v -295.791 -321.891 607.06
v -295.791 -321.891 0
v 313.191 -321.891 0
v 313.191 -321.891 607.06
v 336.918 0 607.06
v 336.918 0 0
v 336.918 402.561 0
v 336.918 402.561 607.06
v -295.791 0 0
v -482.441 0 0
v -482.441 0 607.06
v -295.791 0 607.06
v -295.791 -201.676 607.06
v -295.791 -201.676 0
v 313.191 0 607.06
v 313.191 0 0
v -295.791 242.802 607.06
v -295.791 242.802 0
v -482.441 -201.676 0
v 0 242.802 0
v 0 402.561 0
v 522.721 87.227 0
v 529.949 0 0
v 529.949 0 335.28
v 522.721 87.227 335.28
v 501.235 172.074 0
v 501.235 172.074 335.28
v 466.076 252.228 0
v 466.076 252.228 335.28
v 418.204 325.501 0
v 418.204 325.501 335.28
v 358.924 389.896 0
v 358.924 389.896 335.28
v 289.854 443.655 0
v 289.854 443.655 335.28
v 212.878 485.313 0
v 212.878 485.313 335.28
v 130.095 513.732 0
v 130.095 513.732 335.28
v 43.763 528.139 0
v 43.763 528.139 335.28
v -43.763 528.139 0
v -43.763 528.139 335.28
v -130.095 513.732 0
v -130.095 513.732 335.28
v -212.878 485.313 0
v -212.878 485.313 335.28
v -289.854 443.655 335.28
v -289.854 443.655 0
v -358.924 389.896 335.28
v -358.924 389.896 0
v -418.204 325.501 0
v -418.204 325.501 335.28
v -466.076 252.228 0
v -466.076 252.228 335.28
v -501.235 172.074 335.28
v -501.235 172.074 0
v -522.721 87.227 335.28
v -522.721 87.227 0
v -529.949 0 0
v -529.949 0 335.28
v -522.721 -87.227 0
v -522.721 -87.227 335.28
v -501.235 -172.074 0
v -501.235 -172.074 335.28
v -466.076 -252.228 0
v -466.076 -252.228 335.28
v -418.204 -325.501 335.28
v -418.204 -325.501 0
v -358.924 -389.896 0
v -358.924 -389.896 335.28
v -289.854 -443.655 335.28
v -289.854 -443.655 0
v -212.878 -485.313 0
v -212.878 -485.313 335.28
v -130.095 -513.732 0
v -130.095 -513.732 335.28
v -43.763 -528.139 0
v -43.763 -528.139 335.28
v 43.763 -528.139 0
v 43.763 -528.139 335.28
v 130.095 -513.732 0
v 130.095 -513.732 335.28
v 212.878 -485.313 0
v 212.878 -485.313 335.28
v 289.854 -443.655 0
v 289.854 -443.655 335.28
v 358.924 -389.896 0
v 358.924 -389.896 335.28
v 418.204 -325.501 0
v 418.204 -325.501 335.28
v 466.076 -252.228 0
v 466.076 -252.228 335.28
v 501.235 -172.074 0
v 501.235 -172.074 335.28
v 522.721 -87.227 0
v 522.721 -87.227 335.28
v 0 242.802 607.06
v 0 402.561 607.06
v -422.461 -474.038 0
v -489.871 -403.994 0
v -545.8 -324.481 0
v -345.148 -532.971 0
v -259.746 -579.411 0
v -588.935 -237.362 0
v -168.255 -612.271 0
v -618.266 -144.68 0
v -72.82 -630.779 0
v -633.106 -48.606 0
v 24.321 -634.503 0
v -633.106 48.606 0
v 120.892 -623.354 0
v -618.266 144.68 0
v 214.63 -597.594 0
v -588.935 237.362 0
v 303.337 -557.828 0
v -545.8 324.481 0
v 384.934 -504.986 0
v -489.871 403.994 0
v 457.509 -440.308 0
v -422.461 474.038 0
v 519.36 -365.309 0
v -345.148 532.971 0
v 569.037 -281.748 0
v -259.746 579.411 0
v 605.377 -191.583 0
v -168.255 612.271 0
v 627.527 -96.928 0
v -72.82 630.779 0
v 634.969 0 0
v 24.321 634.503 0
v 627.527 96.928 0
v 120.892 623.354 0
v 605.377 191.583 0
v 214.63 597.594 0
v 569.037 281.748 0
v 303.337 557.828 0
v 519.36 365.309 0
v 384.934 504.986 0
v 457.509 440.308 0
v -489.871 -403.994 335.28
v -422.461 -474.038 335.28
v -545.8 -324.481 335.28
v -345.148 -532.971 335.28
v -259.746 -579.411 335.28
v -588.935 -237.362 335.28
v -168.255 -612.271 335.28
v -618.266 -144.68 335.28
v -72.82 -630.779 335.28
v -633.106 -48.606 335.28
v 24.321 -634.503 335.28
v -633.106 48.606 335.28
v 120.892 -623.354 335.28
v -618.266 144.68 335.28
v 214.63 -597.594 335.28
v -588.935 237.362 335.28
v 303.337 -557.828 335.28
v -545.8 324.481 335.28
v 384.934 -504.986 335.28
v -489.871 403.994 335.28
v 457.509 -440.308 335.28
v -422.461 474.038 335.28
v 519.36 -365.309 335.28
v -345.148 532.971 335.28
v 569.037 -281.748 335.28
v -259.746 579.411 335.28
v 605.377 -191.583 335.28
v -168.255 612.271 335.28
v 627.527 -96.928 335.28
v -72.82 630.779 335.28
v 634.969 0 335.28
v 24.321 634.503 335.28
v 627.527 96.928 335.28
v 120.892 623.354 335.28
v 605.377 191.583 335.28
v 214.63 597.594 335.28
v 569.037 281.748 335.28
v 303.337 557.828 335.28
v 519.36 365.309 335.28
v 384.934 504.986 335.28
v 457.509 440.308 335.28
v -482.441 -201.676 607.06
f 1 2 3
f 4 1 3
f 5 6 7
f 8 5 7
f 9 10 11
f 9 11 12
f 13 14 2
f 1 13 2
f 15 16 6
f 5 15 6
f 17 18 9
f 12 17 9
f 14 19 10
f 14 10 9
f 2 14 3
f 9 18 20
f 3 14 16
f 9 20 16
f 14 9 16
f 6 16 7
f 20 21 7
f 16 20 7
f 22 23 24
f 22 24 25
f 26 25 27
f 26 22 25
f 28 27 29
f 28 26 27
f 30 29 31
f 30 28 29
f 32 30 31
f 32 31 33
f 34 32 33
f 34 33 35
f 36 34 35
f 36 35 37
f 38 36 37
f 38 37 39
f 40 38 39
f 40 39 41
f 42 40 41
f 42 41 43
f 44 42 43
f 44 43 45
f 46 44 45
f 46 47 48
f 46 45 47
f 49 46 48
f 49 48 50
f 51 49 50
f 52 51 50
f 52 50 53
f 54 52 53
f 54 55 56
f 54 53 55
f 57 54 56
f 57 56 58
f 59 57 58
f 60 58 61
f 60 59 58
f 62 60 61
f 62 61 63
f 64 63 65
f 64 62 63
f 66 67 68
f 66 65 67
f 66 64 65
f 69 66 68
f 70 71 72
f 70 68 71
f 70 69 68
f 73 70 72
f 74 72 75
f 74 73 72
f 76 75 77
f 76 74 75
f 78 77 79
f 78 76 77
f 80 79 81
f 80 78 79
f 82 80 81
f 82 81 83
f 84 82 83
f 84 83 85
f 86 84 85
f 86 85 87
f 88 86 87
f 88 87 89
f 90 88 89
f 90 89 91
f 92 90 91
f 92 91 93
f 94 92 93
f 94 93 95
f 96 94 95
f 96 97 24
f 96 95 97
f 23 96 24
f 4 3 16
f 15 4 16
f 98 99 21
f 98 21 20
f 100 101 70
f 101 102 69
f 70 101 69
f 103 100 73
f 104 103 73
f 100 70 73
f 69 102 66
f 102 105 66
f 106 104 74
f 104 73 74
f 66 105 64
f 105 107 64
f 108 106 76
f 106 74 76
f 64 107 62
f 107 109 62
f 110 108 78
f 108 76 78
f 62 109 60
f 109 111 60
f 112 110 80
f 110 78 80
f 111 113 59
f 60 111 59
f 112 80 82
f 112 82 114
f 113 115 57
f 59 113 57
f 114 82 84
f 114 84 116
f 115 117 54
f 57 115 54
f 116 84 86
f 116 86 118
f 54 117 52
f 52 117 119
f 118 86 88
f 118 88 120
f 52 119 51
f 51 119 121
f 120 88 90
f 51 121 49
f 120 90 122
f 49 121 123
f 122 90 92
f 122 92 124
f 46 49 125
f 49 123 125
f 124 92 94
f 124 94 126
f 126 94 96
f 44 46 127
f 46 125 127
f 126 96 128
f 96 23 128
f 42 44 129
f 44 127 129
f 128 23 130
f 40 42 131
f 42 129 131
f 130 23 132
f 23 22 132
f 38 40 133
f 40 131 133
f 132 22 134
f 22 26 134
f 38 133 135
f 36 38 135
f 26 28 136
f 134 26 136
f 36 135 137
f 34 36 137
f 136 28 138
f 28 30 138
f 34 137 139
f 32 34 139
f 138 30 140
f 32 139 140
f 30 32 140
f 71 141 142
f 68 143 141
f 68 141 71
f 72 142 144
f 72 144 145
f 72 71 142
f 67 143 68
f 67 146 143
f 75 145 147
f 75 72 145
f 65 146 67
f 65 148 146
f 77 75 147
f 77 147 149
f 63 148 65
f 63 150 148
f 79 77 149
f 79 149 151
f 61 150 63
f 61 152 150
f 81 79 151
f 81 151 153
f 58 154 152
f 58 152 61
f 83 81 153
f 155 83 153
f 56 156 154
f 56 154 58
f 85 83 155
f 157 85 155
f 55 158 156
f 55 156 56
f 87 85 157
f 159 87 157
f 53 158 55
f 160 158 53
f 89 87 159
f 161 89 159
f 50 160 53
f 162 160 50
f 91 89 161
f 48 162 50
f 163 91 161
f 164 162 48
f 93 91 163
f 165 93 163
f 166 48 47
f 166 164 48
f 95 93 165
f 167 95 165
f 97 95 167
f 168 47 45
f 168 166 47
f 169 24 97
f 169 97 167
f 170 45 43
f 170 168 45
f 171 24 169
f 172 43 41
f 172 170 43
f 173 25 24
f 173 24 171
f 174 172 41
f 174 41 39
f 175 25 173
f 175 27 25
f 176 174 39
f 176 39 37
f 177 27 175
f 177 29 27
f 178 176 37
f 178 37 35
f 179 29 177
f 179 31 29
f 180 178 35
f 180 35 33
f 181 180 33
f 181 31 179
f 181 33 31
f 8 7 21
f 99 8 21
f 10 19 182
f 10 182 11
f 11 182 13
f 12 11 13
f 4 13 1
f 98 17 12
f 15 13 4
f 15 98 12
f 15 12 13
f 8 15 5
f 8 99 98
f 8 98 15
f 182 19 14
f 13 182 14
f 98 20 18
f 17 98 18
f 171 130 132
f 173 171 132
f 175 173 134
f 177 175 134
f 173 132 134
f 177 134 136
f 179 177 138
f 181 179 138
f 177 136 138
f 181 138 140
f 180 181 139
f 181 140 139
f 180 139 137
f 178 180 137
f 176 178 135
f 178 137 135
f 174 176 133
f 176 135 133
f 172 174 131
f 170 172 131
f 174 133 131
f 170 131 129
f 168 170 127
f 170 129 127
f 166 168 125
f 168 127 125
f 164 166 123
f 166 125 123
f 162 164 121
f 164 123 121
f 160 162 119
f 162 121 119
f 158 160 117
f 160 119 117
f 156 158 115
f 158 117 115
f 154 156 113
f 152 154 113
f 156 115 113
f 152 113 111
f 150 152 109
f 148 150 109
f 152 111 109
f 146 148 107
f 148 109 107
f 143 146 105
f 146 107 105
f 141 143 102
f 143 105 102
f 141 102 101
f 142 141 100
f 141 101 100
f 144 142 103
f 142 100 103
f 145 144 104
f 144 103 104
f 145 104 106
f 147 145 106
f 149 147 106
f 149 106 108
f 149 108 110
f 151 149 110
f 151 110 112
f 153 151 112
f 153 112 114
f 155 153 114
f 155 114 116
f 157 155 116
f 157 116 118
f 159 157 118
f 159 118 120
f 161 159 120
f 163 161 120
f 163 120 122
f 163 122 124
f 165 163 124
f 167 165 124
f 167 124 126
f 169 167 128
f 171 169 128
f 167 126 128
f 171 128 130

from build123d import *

# Parameters (mm, degrees)
F0_R     = 634.968711353
F1_DEPTH = 335.28
F2_R     = 529.9486766213
F3_DEPTH = 337.82
F4_W     = 295.791476965
F4_H     = 201.6759961843
F4_W_2   = 313.1909668446
F4_H_2   = 242.8020834923
F4_W_3   = 186.6491734982
F5_DEPTH = 607.06


with BuildPart() as f1:
    # F0 (on Top) → F1 (new body)
    with BuildSketch(Plane.XY):
        Circle(F0_R)
    extrude(amount=F1_DEPTH)

    # F2 (on Top) → F3 (cut)
    with BuildSketch(Plane.XY):
        Circle(F2_R)
    extrude(amount=F3_DEPTH, mode=Mode.SUBTRACT)


with BuildPart() as f5:
    # F4 (on Top) → F5 (new body)
    with BuildSketch(Plane.XY):
        with Locations((-147.8957384825, -100.8379980922)):
            Rectangle(F4_W, F4_H)
        Polygon((313.1909668446, 0), (0, 0), (0, -201.6759961843), (-295.791476965, -201.6759961843), (-295.791476965, -321.8907117844), (313.1909668446, -321.8907117844), align=None)
        with Locations((156.5954834223, 121.4010417461)):
            Rectangle(F4_W_2, F4_H_2)
        with Locations((-147.8957384825, 121.4010417461)):
            Rectangle(F4_W, F4_H_2)
        with Locations((-389.116063714, -100.8379980922)):
            Rectangle(F4_W_3, F4_H)
        Polygon((313.1909668446, 242.8020834923), (313.1909668446, 0), (336.9175493717, 0), (336.9175493717, 402.5610983372), (0, 402.5610983372), (0, 242.8020834923), align=None)
    extrude(amount=F5_DEPTH)


solid = Compound([f1.part, f5.part])
